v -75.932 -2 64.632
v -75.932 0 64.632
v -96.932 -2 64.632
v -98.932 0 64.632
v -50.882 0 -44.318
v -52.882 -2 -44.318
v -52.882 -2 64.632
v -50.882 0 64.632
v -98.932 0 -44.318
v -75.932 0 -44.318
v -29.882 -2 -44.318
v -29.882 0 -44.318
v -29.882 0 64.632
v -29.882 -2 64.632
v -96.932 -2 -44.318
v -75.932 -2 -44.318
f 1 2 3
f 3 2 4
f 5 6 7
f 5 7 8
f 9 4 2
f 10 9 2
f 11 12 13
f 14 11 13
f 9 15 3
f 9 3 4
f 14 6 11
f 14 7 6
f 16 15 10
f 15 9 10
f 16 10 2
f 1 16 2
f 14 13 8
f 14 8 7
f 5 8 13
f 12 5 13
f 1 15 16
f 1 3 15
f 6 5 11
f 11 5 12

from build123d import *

# Parameters (mm, degrees)
F1_DEPTH = 2
F3_DEPTH = 250
F5_DEPTH = 250


with BuildPart() as f1:
    # F0 (on Front) → F1 (new body)
    with BuildSketch(Plane.XZ):
        Polygon((-77.932378, -44.318121), (-75.932378, -44.318121), (-75.932378, 64.631879), (-98.932378, 64.631879), (-98.932378, -44.318121), align=None)
        Polygon((-52.882172, -44.318121), (-31.882172, -44.318121), (-29.882172, -44.318121), (-29.882172, 64.631879), (-52.882172, 64.631879), align=None)
    extrude(amount=F1_DEPTH)

    # F2 (on face) → F3 (cut)
    with BuildSketch(Plane.XY.offset(64.631879)):
        Polygon((-98.932378, 0), (-98.932378, -2), (-96.932378, -2), align=None)
    extrude(amount=-F3_DEPTH, mode=Mode.SUBTRACT)

    # F4 (on face) → F5 (cut)
    with BuildSketch(Plane.XY.offset(64.631879)):
        Polygon((-52.882172, -2), (-50.882172, 0), (-52.882172, 0), align=None)
    extrude(amount=-F5_DEPTH, mode=Mode.SUBTRACT)


solid = f1.part
